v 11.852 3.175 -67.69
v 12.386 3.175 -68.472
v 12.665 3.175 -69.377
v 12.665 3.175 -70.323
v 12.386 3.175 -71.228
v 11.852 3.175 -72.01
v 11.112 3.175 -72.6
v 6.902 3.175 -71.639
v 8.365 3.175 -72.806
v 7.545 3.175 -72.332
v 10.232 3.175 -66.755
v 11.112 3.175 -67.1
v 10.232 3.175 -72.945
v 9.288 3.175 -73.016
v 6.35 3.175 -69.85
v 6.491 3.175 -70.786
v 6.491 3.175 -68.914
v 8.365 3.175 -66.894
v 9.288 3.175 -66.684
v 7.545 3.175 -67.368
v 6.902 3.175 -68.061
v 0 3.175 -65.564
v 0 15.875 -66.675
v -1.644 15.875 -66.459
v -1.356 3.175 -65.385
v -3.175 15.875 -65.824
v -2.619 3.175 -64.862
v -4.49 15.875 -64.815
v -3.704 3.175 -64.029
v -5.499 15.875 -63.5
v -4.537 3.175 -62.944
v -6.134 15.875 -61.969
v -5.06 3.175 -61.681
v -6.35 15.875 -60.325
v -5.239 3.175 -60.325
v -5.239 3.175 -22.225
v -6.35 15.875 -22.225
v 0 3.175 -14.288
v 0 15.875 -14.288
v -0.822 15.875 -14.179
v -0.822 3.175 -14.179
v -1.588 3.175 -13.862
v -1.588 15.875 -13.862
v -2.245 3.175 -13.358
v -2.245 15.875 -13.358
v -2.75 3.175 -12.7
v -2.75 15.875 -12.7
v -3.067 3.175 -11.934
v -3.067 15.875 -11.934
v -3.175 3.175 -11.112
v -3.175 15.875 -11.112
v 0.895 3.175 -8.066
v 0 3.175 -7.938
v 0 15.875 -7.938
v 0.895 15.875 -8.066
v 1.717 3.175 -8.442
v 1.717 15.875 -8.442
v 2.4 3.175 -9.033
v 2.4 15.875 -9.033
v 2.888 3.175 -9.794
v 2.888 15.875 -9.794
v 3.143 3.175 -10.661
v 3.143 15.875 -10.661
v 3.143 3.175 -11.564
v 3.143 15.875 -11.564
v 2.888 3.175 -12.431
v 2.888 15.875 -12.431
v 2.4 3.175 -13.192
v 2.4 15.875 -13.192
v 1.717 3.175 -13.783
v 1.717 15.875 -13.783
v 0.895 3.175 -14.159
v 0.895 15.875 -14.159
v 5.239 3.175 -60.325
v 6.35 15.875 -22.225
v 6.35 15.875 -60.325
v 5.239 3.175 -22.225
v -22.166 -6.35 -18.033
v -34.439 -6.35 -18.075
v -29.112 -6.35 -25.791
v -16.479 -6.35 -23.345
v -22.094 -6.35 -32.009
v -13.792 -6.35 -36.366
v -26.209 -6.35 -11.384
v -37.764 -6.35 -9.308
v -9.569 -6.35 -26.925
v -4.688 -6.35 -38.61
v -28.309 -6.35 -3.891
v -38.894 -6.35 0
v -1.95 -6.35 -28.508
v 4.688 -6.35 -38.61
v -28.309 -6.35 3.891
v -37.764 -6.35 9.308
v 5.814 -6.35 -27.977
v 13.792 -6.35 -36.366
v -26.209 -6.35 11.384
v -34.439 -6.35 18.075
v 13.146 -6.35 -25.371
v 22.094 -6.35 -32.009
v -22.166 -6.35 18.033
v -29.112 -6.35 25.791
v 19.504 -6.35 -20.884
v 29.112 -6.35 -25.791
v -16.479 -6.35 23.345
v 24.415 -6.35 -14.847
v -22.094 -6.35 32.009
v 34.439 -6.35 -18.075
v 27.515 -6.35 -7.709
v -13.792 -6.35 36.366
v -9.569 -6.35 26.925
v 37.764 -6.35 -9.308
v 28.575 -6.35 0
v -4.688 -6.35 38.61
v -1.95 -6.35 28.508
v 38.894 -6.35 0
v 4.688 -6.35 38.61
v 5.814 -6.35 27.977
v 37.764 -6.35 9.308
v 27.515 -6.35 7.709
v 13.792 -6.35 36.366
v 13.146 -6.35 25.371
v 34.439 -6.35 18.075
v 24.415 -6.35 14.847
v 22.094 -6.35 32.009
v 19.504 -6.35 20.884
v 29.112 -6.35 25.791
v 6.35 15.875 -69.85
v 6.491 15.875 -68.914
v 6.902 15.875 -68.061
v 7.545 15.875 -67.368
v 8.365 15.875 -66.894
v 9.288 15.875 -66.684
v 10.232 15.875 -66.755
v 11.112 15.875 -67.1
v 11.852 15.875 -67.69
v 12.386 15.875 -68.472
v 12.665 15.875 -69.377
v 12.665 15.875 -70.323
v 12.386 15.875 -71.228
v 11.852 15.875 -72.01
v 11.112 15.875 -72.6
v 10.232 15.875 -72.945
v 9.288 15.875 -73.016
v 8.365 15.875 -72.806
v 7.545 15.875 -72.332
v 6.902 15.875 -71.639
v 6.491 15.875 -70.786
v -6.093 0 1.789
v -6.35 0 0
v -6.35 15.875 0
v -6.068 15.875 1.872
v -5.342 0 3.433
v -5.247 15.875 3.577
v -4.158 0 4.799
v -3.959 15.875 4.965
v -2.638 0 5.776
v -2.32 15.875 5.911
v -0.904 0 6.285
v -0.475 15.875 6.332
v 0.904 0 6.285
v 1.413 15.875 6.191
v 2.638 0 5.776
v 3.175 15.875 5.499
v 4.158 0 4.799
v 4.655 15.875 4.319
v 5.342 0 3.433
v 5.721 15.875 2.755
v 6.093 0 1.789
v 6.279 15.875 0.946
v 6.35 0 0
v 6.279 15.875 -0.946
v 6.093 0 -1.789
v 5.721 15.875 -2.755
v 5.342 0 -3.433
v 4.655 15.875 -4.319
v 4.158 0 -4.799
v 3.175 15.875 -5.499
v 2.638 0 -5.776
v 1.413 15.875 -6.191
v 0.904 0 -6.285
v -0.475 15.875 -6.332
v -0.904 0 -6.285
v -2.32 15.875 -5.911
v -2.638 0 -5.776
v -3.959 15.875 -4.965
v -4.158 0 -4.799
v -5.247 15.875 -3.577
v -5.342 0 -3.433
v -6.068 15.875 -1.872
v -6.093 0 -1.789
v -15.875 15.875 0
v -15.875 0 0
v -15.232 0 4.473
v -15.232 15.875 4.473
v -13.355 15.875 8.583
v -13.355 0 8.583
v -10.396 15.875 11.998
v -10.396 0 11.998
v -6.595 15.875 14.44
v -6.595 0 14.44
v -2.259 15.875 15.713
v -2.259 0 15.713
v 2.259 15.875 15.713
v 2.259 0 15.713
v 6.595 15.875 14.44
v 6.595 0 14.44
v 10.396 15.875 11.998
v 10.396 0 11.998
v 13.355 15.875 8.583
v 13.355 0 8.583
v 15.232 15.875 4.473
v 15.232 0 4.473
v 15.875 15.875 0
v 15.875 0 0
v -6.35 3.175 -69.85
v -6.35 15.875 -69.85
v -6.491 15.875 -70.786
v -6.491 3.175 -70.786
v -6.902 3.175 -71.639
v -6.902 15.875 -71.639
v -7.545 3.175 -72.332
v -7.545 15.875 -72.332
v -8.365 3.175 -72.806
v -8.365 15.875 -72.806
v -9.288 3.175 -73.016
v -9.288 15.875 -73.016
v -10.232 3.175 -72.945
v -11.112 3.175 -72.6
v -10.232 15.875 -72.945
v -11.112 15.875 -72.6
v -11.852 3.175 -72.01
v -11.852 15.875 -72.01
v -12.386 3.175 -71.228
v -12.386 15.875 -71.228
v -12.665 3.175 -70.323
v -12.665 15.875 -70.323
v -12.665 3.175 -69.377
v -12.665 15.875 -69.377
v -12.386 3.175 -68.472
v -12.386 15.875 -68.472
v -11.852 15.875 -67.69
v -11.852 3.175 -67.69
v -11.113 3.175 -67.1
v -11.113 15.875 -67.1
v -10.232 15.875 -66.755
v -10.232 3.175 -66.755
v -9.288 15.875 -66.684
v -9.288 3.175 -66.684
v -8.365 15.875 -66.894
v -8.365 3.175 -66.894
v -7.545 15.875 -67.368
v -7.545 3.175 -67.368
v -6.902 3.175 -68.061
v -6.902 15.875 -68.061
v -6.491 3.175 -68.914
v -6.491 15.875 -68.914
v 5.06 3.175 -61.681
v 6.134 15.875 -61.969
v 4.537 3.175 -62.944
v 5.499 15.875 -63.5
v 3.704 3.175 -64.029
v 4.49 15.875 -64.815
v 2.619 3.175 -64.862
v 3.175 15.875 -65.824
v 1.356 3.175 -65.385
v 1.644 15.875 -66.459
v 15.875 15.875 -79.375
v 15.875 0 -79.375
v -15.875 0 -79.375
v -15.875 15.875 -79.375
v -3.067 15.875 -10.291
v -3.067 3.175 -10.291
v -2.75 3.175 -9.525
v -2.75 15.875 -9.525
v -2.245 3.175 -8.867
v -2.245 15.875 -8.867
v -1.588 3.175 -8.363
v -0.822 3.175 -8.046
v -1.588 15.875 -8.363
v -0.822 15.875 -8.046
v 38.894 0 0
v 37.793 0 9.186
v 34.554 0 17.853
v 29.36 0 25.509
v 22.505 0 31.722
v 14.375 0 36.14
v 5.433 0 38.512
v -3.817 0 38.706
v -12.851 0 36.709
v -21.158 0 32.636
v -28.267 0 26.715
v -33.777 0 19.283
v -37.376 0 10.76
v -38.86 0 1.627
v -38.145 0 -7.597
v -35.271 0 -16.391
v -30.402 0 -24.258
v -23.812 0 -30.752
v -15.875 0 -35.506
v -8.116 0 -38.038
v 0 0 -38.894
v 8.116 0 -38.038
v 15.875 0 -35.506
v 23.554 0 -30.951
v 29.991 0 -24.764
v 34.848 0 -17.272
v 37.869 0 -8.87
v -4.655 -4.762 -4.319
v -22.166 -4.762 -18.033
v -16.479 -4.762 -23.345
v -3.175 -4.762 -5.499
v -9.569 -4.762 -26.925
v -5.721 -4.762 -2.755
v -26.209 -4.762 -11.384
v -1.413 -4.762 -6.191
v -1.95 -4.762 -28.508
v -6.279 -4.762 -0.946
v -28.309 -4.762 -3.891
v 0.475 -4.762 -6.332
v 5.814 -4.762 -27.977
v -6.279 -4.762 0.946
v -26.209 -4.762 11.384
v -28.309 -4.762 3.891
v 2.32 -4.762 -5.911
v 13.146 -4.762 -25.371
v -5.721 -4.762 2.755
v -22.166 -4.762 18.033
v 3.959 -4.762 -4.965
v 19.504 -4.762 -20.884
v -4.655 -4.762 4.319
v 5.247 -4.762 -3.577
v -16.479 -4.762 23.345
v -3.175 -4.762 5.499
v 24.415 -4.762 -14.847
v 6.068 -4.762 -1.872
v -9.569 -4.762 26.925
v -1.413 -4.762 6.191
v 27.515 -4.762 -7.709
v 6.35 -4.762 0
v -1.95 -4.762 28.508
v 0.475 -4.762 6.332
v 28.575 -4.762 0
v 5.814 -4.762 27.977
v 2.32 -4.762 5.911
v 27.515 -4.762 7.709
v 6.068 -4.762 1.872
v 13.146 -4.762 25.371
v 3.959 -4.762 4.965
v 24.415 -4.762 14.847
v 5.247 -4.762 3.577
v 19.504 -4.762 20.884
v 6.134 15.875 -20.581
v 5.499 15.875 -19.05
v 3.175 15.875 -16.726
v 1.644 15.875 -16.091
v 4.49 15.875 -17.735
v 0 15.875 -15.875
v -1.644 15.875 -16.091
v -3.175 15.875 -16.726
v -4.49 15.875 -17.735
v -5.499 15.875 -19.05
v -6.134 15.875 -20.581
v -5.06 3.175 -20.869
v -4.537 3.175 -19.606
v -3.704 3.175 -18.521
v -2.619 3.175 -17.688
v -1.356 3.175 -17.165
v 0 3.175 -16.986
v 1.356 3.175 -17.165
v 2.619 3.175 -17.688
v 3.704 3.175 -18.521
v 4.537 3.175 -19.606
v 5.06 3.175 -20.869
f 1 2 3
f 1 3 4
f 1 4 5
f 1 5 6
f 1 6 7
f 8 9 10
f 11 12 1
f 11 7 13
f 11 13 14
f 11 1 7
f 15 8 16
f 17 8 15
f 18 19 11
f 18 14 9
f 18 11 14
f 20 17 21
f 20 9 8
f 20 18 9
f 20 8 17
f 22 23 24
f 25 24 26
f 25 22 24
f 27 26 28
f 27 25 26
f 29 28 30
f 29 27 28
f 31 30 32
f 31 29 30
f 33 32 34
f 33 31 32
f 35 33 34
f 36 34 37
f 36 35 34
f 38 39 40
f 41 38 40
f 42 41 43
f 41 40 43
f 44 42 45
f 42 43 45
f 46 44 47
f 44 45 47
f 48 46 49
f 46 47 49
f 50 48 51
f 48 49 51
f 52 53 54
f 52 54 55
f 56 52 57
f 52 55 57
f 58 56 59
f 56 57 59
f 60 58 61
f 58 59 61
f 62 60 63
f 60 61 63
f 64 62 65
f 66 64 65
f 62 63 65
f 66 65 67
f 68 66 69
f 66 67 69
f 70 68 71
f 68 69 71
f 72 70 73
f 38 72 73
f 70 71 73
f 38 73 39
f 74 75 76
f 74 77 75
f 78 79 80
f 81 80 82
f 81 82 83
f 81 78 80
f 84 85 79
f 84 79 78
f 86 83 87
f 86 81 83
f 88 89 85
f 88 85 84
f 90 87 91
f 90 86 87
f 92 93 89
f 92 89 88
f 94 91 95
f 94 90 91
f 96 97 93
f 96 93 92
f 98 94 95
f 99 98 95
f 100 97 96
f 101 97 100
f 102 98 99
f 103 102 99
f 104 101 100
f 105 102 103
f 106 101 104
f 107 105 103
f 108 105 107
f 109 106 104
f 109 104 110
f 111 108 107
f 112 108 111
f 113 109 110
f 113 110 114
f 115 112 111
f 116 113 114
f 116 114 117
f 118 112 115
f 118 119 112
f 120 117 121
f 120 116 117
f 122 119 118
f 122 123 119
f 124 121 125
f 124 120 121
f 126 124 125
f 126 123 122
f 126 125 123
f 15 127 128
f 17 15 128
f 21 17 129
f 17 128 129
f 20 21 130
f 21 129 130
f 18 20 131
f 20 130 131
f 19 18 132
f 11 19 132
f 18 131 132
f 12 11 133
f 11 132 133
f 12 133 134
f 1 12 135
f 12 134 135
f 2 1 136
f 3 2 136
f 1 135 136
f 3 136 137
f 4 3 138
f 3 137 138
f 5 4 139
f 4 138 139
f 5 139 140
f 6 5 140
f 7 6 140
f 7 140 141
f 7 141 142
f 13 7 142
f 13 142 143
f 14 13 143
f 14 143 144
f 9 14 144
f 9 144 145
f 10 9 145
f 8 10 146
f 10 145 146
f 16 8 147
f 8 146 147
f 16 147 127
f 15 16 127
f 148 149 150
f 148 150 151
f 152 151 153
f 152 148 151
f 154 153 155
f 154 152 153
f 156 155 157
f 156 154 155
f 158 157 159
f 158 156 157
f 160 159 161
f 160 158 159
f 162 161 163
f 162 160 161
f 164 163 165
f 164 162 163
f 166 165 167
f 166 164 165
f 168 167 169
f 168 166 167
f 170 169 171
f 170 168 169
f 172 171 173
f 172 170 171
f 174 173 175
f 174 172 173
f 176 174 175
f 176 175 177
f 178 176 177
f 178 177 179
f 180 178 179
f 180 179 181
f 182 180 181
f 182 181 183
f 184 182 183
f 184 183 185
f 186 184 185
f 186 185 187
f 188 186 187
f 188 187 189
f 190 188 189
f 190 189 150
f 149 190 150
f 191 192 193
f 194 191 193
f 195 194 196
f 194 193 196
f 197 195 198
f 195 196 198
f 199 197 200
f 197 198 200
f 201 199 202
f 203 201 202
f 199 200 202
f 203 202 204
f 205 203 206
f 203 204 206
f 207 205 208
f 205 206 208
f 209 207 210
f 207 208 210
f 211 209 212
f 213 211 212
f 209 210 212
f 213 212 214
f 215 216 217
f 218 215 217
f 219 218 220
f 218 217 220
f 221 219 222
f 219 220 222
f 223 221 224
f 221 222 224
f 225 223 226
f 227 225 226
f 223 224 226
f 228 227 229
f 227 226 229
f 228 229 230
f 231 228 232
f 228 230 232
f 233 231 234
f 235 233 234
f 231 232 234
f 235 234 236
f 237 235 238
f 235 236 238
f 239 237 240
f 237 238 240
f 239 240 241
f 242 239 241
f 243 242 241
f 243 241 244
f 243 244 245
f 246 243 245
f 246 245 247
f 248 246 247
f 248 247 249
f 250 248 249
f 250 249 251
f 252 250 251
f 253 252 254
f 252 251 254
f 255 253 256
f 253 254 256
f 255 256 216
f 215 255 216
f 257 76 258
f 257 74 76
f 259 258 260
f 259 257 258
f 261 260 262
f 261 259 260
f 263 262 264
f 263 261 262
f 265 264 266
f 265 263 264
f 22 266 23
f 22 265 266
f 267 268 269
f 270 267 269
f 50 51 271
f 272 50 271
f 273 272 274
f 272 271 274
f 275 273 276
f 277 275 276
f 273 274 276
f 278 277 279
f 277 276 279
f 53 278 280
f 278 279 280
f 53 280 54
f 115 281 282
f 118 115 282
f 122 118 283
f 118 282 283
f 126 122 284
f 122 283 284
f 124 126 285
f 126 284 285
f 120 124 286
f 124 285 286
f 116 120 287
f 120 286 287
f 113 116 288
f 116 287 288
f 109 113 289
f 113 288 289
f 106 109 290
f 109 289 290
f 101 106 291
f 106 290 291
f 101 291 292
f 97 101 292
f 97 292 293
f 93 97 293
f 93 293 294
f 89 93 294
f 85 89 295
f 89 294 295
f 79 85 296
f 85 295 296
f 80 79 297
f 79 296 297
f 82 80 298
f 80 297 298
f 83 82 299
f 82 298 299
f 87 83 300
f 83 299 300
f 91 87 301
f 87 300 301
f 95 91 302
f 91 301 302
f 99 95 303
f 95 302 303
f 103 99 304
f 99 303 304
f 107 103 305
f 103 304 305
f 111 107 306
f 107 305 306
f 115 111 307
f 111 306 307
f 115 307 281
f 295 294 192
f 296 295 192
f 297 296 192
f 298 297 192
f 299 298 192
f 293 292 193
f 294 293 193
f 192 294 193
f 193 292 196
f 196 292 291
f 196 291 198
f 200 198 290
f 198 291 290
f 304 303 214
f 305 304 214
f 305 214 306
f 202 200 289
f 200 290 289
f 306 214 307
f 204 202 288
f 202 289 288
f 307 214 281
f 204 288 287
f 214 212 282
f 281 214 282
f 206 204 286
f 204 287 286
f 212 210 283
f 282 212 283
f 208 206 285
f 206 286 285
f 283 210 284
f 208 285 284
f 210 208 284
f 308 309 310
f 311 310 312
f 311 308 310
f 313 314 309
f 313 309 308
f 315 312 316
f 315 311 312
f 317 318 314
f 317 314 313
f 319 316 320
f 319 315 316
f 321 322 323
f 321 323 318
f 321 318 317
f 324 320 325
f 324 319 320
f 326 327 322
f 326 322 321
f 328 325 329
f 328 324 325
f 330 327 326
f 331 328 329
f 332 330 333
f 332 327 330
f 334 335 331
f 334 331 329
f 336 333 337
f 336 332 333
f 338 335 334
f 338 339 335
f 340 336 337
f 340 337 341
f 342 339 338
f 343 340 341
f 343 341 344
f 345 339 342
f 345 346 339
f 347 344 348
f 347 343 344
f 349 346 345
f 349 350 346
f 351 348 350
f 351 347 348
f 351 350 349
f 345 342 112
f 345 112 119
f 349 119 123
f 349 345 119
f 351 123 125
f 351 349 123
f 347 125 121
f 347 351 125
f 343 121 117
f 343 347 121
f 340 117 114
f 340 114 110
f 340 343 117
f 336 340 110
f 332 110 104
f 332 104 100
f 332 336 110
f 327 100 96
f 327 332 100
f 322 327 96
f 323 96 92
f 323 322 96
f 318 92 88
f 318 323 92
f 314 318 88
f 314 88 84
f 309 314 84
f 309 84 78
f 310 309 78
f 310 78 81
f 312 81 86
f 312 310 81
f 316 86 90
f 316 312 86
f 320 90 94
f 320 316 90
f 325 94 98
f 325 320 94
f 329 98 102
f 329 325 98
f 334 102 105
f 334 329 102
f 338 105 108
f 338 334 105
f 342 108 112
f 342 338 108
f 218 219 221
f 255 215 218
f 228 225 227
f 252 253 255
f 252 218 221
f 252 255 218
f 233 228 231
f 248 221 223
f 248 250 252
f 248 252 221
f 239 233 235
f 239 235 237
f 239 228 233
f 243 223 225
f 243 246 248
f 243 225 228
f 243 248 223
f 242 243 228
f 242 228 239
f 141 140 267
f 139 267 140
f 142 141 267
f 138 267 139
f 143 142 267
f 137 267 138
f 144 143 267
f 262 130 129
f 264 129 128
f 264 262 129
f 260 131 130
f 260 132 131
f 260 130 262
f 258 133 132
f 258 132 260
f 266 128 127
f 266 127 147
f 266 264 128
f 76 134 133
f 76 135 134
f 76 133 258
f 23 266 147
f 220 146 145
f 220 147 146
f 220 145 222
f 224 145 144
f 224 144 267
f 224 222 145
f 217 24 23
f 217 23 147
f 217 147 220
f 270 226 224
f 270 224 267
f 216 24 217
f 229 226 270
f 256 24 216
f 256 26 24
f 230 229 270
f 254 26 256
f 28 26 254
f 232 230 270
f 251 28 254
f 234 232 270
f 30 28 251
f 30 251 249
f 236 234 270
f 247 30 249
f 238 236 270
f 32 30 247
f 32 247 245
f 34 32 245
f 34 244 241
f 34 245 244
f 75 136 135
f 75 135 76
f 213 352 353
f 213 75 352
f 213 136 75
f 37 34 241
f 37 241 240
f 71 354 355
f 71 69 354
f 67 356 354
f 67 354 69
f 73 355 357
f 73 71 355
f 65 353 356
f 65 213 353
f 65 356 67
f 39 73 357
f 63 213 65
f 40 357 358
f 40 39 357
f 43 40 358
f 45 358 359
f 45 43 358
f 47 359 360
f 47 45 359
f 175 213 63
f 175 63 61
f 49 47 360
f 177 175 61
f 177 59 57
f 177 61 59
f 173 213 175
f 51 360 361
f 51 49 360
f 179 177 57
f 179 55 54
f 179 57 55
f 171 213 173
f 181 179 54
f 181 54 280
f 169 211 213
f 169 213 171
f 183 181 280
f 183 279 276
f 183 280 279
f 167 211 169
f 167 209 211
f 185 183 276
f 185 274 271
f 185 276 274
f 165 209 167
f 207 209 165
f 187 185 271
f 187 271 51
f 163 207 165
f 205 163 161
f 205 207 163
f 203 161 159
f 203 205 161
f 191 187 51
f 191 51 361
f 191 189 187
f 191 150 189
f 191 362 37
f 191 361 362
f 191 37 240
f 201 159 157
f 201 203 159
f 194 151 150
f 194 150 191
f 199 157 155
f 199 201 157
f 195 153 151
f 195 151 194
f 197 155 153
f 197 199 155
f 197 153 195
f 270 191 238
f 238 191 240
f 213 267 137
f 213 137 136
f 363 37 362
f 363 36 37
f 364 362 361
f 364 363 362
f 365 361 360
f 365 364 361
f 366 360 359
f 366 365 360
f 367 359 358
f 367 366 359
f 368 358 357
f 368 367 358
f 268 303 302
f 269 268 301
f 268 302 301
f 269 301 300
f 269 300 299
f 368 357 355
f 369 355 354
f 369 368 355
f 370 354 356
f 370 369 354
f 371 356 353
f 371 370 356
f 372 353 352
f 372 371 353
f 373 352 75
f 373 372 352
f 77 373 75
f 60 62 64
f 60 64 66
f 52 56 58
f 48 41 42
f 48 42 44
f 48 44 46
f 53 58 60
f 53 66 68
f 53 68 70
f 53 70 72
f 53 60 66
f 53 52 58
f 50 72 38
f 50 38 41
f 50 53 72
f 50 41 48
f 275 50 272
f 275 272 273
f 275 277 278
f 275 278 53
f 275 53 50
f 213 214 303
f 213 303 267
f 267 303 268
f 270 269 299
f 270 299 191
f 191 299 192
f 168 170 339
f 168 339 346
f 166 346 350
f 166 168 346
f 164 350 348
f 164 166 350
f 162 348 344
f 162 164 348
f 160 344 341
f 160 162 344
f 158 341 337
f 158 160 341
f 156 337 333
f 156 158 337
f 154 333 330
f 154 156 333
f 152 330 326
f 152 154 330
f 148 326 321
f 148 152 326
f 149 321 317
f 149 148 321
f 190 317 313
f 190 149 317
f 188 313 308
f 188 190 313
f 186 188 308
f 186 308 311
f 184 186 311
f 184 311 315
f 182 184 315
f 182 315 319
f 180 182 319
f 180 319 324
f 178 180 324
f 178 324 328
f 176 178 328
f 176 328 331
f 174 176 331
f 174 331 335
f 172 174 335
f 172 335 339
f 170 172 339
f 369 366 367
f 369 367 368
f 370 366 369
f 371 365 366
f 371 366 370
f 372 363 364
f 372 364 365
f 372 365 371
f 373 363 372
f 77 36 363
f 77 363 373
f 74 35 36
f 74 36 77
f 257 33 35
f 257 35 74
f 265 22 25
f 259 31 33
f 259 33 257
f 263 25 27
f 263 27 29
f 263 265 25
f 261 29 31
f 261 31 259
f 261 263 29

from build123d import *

# Parameters (mm, degrees)
F0_R     = 38.89375
F0_R_2   = 6.35
F1_DEPTH = 4.7625
F2_R     = 38.89375
F2_R_2   = 28.575
F3_DEPTH = 1.5875
F4_R     = 6.35
F5_DEPTH = 15.875
F7_DEPTH = 12.7
F7_TAPER = 5
F8_R     = 3.175
F9_DEPTH = 12.7


with BuildPart() as f1:
    # F0 (on Front) → F1 (new body)
    with BuildSketch(Plane.XZ):
        Circle(F0_R)
        Circle(F0_R_2, mode=Mode.SUBTRACT)
    extrude(amount=F1_DEPTH)

    # F2 (on face) → F3 (join)
    with BuildSketch(Plane.XZ.offset(4.7625)):
        Circle(F2_R)
        Circle(F2_R_2, mode=Mode.SUBTRACT)
    extrude(amount=F3_DEPTH)

    # F4 (on face) → F5 (join)
    with BuildSketch(Plane(origin=(0, 0, 0), x_dir=(-1, 0, 0), z_dir=(0, 1, 0))):
        with BuildLine():
            Line((-15.875, -79.375), (15.875, -79.375))
            Line((15.875, -79.375), (15.875, -35.5064524286))
            ThreePointArc((15.875, -35.5064524286), (0, -38.89375), (-15.875, -35.5064524286))
            Line((-15.875, -35.5064524286), (-15.875, -79.375))
        make_face()
        with BuildLine():
            ThreePointArc((-15.875, -35.5064524286), (0, -38.89375), (15.875, -35.5064524286))
            Line((15.875, -35.5064524286), (15.875, 0))
            ThreePointArc((15.875, 0), (4.9e-09, -15.875), (-15.875, -9.8e-09))
            Line((-15.875, -9.8e-09), (-15.875, -35.5064524286))
        make_face()
        with BuildLine():
            ThreePointArc((-15.875, -9.8e-09), (4.9e-09, -15.875), (15.875, 0))
            ThreePointArc((15.875, 0), (-4.9e-09, 15.875), (-15.875, -9.8e-09))
        make_face()
        Circle(F4_R, mode=Mode.SUBTRACT)
    extrude(amount=F5_DEPTH)

    # F6 (on face) → F7 (cut)
    with BuildSketch(Plane(origin=(0, 15.875, 0), x_dir=(-1, 0, 0), z_dir=(0, 1, 0))):
        with BuildLine():
            ThreePointArc((-6.35, -60.325), (-4.4901280605, -64.8151280605), (0, -66.675))
            Line((0, -66.675), (0, -60.325))
            Line((0, -60.325), (-6.35, -60.325))
        make_face()
        with BuildLine():
            Line((0, -60.325), (0, -66.675))
            ThreePointArc((0, -66.675), (4.4901280605, -64.8151280605), (6.35, -60.325))
            Line((6.35, -60.325), (0, -60.325))
        make_face()
        with BuildLine():
            Line((-6.35, -60.325), (0, -60.325))
            Line((0, -60.325), (0, -53.975))
            ThreePointArc((0, -53.975), (-4.4901280605, -55.8348719395), (-6.35, -60.325))
        make_face()
        with BuildLine():
            Line((0, -53.975), (0, -60.325))
            Line((0, -60.325), (6.35, -60.325))
            ThreePointArc((6.35, -60.325), (4.4901280605, -55.8348719395), (0, -53.975))
        make_face()
        with BuildLine():
            Line((-6.35, -22.225), (-6.35, -60.325))
            ThreePointArc((-6.35, -60.325), (-4.4901280605, -55.8348719395), (0, -53.975))
            Line((0, -53.975), (0, -28.575))
            ThreePointArc((0, -28.575), (-4.4901280605, -26.7151280605), (-6.35, -22.225))
        make_face()
        with BuildLine():
            ThreePointArc((0, -53.975), (4.4901280605, -55.8348719395), (6.35, -60.325))
            Line((6.35, -60.325), (6.35, -22.225))
            ThreePointArc((6.35, -22.225), (4.4901280605, -26.7151280605), (0, -28.575))
            Line((0, -28.575), (0, -53.975))
        make_face()
        with BuildLine():
            ThreePointArc((0, -15.875), (-4.4901280605, -17.7348719395), (-6.35, -22.225))
            Line((-6.35, -22.225), (0, -22.225))
            Line((0, -22.225), (0, -15.875))
        make_face()
        with BuildLine():
            Line((0, -22.225), (-6.35, -22.225))
            ThreePointArc((-6.35, -22.225), (-4.4901280605, -26.7151280605), (0, -28.575))
            Line((0, -28.575), (0, -22.225))
        make_face()
        with BuildLine():
            ThreePointArc((0, -28.575), (4.4901280605, -26.7151280605), (6.35, -22.225))
            Line((6.35, -22.225), (0, -22.225))
            Line((0, -22.225), (0, -28.575))
        make_face()
        with BuildLine():
            Line((0, -22.225), (6.35, -22.225))
            ThreePointArc((6.35, -22.225), (4.4901280605, -17.7348719395), (0, -15.875))
            Line((0, -15.875), (0, -22.225))
        make_face()
    extrude(amount=-F7_DEPTH, taper=F7_TAPER, mode=Mode.SUBTRACT)

    # F8 (on face) → F9 (cut)
    with BuildSketch(Plane(origin=(0, 15.875, 0), x_dir=(-1, 0, 0), z_dir=(0, 1, 0))):
        with BuildLine():
            ThreePointArc((3.175, -11.1125), (2.2450640303, -8.8674359697), (0, -7.9375))
            Line((0, -7.9375), (0, -14.2875))
            ThreePointArc((0, -14.2875), (2.2450640303, -13.3575640303), (3.175, -11.1125))
        make_face()
        with BuildLine():
            ThreePointArc((12.7, -69.85), (9.525, -66.675), (6.35, -69.85))
            ThreePointArc((6.35, -69.85), (9.525, -73.025), (12.7, -69.85))
        make_face()
        with Locations((-9.525, -69.85)):
            Circle(F8_R)
        with BuildLine():
            Line((0, -14.2875), (0, -7.9375))
            ThreePointArc((0, -7.9375), (-3.175, -11.1125), (0, -14.2875))
        make_face()
    extrude(amount=-F9_DEPTH, mode=Mode.SUBTRACT)


solid = f1.part
